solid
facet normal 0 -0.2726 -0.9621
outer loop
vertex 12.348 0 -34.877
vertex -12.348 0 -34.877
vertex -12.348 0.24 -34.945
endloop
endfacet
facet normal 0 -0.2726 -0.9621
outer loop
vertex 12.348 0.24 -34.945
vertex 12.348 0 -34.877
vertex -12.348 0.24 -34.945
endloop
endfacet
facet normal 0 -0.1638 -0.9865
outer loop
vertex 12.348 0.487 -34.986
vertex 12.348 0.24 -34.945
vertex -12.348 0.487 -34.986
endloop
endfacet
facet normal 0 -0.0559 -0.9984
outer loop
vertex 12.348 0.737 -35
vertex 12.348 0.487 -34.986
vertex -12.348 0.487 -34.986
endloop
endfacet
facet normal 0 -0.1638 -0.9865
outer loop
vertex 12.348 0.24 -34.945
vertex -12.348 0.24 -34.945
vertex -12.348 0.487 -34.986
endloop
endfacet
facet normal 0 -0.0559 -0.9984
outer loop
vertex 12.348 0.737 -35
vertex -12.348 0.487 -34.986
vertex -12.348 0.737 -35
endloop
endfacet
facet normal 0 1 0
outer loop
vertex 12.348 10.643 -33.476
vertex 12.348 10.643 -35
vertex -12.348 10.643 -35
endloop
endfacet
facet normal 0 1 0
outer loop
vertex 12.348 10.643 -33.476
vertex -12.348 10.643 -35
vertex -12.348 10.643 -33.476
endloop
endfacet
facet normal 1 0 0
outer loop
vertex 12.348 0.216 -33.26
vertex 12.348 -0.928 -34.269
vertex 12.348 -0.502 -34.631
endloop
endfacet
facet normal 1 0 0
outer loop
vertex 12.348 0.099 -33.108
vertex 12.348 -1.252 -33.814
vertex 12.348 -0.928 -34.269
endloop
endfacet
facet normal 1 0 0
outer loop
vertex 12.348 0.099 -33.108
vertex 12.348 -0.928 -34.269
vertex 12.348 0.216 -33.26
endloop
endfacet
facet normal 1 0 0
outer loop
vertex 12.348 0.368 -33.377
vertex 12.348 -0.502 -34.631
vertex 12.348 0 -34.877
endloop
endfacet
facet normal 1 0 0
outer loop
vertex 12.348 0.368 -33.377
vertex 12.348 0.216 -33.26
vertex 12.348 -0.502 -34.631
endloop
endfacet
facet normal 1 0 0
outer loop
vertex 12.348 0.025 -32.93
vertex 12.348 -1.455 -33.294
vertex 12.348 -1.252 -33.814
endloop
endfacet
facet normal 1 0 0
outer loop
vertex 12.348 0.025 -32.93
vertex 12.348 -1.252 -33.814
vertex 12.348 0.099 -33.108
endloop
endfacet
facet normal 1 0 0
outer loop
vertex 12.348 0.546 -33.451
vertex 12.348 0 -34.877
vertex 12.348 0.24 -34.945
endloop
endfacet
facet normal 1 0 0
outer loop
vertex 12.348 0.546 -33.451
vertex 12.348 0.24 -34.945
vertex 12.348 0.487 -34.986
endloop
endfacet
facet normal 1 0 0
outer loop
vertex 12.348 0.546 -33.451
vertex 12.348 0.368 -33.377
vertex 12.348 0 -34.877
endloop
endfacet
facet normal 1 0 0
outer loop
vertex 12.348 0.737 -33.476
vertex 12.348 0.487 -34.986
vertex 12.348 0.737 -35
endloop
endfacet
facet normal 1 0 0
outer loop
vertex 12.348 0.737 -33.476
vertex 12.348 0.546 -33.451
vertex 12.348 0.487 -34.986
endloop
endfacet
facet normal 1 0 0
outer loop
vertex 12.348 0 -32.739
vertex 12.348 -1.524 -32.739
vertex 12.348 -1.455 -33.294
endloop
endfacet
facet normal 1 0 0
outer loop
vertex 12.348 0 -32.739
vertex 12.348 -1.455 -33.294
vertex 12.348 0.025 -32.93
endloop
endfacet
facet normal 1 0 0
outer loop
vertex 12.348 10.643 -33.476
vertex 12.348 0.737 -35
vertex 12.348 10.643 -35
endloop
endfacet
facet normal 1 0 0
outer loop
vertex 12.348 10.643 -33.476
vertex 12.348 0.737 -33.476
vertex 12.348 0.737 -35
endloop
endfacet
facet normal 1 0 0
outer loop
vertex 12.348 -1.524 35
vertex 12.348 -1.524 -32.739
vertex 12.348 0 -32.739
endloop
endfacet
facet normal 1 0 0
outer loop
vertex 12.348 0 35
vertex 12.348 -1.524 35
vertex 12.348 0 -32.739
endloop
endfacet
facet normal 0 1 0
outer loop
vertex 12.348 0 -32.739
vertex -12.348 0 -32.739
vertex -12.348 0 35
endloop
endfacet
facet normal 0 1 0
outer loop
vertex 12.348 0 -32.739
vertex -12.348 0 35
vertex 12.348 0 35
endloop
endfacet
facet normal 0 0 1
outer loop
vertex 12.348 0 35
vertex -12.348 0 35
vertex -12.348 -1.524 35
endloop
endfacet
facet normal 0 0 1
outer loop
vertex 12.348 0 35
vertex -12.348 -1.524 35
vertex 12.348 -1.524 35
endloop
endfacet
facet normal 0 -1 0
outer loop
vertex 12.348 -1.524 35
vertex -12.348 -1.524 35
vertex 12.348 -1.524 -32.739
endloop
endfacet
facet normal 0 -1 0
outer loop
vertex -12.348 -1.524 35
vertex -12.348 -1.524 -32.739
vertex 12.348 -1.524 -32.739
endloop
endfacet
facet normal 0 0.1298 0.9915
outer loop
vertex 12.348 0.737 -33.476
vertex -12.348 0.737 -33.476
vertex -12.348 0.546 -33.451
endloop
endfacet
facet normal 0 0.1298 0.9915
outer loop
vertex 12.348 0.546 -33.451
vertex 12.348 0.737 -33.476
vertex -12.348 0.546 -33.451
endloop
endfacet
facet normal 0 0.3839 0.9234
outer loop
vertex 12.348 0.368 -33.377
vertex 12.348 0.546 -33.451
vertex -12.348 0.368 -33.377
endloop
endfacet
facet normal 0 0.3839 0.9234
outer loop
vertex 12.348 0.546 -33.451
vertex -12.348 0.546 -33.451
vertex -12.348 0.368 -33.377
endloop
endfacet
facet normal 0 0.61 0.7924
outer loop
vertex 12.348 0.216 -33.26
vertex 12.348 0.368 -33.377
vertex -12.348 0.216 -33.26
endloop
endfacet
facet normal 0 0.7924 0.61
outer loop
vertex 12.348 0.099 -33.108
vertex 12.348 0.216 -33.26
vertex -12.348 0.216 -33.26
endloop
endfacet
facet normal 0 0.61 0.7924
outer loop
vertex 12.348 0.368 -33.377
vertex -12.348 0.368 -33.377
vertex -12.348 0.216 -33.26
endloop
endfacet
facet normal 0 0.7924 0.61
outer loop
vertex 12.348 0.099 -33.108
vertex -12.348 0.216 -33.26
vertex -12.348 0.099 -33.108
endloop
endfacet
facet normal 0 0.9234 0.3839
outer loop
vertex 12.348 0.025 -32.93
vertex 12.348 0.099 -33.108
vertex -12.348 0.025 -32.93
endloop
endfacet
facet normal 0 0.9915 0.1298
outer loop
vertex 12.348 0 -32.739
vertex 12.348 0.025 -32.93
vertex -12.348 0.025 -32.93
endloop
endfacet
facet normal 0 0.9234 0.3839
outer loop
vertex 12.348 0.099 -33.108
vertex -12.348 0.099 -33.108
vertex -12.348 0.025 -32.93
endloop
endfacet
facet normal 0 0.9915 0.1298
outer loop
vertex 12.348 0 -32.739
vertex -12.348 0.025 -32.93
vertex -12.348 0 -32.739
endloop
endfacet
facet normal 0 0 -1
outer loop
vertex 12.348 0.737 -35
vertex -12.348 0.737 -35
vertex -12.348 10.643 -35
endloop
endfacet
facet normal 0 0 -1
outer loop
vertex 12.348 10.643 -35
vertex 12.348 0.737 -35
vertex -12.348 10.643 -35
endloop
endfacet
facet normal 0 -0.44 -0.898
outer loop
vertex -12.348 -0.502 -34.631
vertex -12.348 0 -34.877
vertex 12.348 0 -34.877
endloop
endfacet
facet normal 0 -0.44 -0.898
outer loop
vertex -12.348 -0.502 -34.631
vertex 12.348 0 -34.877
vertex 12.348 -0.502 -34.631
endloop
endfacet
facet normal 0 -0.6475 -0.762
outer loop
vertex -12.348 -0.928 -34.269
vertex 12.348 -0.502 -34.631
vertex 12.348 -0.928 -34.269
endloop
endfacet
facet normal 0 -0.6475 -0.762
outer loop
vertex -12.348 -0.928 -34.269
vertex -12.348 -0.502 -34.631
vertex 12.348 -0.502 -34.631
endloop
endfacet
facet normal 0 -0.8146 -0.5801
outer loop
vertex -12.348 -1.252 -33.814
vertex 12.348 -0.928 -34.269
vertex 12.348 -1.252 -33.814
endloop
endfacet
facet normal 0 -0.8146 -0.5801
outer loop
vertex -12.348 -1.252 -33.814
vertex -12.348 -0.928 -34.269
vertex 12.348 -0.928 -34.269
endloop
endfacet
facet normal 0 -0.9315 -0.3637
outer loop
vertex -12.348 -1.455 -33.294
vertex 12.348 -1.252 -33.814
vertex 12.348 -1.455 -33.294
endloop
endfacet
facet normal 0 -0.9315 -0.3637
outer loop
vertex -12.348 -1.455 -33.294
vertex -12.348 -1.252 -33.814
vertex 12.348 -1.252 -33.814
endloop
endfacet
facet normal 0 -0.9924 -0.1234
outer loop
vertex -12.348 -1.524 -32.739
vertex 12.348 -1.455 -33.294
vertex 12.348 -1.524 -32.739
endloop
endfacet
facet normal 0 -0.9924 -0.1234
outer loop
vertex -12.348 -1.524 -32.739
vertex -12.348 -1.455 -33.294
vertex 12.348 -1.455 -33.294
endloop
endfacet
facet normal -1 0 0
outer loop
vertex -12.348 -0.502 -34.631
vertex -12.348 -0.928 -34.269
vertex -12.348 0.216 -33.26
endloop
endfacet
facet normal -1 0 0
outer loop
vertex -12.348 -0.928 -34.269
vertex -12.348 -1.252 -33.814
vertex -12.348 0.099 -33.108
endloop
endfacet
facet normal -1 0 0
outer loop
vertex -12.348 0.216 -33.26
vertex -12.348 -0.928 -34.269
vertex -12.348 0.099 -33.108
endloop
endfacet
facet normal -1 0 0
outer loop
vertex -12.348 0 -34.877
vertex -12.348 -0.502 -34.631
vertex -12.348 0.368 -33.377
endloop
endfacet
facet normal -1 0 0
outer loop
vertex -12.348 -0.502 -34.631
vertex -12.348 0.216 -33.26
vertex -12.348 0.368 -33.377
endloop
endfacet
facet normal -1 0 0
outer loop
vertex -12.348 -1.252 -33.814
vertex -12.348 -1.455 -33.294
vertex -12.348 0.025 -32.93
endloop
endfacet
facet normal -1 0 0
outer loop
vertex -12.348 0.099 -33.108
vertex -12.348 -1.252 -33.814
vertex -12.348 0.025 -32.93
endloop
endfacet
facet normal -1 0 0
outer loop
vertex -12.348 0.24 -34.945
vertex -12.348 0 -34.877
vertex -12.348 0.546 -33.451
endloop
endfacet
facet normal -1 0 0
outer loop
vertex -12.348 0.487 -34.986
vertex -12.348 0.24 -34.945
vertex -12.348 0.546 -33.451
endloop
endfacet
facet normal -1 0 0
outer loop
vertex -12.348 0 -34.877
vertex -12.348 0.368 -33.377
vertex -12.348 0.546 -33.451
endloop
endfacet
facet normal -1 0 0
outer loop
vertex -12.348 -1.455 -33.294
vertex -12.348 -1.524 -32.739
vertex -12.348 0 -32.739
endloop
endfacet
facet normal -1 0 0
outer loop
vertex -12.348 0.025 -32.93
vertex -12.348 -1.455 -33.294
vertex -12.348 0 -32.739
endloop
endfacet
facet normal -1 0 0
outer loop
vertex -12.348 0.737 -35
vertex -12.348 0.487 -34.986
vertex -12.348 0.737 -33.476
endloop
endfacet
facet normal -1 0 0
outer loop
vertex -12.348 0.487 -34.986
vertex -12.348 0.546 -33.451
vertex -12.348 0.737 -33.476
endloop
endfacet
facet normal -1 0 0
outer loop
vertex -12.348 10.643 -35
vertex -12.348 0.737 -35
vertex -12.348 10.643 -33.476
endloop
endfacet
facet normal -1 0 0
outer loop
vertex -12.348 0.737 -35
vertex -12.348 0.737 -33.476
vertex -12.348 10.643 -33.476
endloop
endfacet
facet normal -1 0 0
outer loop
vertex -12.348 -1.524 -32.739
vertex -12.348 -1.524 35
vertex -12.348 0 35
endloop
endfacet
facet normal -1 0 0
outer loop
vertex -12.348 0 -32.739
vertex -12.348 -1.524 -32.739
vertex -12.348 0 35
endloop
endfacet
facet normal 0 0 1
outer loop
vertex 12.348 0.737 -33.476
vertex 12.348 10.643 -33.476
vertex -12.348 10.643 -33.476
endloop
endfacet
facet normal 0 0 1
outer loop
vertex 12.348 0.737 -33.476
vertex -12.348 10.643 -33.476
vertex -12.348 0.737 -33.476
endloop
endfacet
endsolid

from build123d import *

# Parameters (mm, degrees)
BASE_FLANGE1_DEPTH     = 1.524
SKETCHED_START         = -12.348324115
SKETCHED_BEND6_DEPTH   = 24.69664823
SKETCHED_BEND6_2_DEPTH = 24.69664823


# Read off the part's stored shape, not the designer's step: Sketched Bend6
# Sheet-metal steps are written as plain solids
with BuildPart() as part:
    # Sketch2 → Base-Flange1 (new body)
    with BuildSketch(Plane(origin=(0, 0, 0), x_dir=(1, 0, 0), z_dir=(0, 1, 0))):
        Polygon((12.348324115, -35), (12.348324115, 35), (12.348324115, 45), (-12.348324115, 45), (-12.348324115, 35), (-12.348324115, -35), align=None)
    extrude(amount=-BASE_FLANGE1_DEPTH)

    # Sketched Bend6 outline → Sketched Bend6 (cut)
    with BuildSketch(Plane.YZ.offset(SKETCHED_START)):
        with BuildLine():
            Line((0, -45), (0, -34.876625492))
            ThreePointArc((0, -34.876625492), (-1.103980115, -34.051869886), (-1.524, -32.7394))
            Line((-1.524, -32.7394), (-1.524, -45))
            Line((-1.524, -45), (0, -45))
        make_face()
    extrude(amount=SKETCHED_BEND6_DEPTH, mode=Mode.SUBTRACT)

    # Sketched Bend6 2 outline → Sketched Bend6 2 (add)
    with BuildSketch(Plane.YZ.offset(SKETCHED_START)):
        with BuildLine():
            Line((10.643204625, -33.476), (0.7366, -33.476))
            ThreePointArc((0.7366, -33.476), (0.215745145, -33.260254855), (0, -32.7394))
            Line((0, -32.7394), (0, -34.876625492))
            ThreePointArc((0, -34.876625492), (0.363169675, -34.968943037), (0.7366, -35))
            Line((0.7366, -35), (10.643204625, -35))
            Line((10.643204625, -35), (10.643204625, -33.476))
        make_face()
    extrude(amount=SKETCHED_BEND6_2_DEPTH)


solid = part.part
